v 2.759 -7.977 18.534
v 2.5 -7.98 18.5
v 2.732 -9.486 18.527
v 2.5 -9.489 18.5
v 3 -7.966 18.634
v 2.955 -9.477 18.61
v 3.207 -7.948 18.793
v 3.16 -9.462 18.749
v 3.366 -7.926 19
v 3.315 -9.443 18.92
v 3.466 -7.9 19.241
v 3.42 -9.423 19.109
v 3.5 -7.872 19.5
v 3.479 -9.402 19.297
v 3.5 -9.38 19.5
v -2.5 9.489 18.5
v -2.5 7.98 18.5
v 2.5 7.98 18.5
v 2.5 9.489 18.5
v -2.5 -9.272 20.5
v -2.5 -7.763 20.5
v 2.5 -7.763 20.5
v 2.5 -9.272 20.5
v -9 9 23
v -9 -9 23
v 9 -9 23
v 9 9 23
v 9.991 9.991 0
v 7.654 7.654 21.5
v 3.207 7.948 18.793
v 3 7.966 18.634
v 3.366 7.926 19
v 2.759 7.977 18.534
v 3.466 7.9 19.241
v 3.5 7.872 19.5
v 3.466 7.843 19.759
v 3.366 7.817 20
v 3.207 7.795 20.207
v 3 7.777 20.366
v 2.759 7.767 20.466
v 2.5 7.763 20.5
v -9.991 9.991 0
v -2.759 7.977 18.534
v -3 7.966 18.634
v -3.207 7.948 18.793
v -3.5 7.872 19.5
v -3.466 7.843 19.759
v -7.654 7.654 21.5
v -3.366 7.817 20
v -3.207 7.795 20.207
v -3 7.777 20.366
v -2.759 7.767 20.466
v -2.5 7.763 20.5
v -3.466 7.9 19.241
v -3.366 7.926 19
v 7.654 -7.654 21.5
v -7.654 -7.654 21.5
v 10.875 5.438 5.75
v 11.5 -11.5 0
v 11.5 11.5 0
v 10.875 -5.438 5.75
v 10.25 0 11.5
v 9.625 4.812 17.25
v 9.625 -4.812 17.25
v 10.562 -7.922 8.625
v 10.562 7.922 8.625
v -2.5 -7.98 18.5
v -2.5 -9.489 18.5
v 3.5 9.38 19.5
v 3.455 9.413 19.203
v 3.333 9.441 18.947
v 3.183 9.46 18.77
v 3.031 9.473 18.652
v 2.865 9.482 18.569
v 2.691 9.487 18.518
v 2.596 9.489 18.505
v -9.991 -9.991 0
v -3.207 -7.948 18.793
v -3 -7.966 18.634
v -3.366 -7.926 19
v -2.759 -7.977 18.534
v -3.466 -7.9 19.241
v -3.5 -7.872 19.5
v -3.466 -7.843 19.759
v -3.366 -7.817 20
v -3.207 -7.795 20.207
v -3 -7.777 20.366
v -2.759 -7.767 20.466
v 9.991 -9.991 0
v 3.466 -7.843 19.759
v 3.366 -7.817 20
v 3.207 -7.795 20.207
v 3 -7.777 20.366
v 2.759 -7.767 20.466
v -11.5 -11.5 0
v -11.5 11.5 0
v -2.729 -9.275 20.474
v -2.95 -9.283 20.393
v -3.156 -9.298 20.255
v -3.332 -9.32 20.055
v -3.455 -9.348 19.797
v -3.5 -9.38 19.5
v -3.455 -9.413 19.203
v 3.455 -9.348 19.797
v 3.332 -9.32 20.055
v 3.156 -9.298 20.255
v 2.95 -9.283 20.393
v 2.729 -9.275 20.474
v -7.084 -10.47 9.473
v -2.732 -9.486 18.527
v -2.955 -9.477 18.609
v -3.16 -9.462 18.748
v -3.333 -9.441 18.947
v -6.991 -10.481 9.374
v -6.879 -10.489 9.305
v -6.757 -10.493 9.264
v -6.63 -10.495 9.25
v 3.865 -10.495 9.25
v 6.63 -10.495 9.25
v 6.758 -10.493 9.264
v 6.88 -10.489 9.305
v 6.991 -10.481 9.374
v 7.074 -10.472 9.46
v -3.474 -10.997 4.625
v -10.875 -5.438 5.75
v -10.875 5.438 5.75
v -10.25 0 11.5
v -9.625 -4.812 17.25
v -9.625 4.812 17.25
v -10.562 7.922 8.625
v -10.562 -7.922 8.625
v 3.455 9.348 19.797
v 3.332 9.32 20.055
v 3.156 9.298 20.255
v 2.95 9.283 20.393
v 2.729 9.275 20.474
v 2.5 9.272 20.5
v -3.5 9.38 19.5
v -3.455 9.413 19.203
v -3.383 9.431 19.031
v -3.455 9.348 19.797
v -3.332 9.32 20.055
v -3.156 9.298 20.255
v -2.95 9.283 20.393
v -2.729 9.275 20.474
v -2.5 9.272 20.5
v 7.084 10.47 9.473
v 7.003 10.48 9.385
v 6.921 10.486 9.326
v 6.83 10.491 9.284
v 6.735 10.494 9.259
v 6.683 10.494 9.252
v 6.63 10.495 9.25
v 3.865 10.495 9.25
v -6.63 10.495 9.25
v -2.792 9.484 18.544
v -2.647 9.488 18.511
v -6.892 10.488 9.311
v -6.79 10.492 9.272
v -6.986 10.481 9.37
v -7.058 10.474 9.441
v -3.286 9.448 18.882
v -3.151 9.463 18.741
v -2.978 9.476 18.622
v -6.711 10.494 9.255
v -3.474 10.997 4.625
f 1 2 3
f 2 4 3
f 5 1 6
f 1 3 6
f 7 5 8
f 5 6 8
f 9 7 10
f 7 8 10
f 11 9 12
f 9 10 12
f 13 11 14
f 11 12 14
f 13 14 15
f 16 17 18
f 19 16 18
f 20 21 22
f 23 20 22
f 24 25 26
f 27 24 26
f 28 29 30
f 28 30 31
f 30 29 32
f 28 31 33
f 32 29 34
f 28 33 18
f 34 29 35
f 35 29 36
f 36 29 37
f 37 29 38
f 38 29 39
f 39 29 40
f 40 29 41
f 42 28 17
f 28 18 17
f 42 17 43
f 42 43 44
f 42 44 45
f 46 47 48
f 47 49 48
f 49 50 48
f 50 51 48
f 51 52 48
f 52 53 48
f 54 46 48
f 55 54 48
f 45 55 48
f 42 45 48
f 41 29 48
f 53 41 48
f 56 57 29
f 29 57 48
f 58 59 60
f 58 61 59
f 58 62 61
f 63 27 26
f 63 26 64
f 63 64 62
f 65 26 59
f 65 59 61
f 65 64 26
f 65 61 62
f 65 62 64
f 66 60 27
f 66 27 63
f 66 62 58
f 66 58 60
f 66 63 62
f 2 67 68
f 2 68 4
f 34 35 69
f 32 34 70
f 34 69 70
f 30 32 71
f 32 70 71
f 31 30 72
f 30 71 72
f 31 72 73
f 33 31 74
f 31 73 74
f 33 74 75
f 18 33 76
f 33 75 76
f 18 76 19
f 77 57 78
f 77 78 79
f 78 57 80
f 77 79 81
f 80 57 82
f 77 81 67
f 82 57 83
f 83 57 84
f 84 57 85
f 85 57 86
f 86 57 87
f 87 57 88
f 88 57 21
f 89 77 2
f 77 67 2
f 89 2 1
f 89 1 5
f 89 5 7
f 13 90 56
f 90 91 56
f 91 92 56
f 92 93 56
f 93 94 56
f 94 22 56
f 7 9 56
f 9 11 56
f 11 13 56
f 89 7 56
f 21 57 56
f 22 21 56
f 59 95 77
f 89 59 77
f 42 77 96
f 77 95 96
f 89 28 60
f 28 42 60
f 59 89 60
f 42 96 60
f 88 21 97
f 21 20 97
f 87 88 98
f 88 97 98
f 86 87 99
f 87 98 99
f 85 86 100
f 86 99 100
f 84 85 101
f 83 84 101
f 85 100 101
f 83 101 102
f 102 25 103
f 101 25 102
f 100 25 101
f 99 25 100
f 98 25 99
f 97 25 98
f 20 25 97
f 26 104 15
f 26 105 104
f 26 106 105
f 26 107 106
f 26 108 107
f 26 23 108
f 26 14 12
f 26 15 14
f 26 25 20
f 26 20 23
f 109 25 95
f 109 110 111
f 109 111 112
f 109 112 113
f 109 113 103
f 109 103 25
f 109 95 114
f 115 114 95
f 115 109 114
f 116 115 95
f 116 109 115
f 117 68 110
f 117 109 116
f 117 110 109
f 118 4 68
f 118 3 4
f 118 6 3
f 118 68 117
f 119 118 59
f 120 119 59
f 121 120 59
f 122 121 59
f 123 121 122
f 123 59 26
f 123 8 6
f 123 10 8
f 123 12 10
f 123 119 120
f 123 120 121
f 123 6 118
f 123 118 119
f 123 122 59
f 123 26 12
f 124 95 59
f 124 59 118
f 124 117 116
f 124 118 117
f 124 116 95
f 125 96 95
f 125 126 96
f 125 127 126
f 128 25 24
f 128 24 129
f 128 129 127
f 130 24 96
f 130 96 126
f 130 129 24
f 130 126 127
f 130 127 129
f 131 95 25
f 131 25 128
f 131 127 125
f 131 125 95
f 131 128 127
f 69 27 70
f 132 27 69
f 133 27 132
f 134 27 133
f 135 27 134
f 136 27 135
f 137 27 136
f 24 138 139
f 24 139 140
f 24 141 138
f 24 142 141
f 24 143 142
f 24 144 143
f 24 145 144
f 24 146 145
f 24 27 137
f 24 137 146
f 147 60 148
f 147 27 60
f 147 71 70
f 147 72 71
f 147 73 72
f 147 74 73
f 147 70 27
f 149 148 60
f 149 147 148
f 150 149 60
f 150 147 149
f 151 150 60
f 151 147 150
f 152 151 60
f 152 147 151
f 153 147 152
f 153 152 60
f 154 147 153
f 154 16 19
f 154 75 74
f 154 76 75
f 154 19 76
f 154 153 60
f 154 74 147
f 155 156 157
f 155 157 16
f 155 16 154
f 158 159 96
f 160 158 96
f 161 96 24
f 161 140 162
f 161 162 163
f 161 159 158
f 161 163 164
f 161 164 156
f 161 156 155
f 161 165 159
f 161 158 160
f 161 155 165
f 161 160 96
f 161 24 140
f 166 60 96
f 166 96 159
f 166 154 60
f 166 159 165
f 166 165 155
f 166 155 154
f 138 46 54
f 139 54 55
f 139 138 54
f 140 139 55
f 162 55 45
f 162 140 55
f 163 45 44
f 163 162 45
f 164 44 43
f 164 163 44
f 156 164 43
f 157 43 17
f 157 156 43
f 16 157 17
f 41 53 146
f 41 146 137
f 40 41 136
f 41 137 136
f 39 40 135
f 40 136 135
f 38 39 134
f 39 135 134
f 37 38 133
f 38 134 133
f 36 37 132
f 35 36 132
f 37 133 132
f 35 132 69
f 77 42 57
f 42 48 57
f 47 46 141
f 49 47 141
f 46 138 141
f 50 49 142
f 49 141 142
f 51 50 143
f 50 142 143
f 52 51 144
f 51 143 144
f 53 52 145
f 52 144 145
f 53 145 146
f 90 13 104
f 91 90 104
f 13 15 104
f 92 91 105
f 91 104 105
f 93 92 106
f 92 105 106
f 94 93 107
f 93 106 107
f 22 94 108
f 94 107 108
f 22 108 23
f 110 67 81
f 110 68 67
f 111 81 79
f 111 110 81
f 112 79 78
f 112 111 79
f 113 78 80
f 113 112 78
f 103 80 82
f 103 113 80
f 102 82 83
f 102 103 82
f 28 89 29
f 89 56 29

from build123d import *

# Parameters (mm, degrees)
F1_W          = 23
F1_H          = 23
F2_W          = 18
F2_H          = 18
F4_T          = -1.5
F5_W          = 7
F5_H          = 2
F6_DEPTH      = 11.5010001
F6_DEPTH_BACK = 11.5010001
F7_R          = 0.9999


# Not quite as in the source:
# - a fillet or chamfer is up to 0.001 mm smaller than in the source, because OpenCascade refuses the exact size


with BuildPart() as f3:
    # F1 (on Top) → F3 section 0
    with BuildSketch(Plane.XY):
        Rectangle(F1_W, F1_H)
    # F2 (on offset) → F3 section 1
    with BuildSketch(Plane.XY.offset(23)):
        Rectangle(F2_W, F2_H)
    loft()

    # F4
    f4_openings = [f3.faces().sort_by_distance(p)[0] for p in [
        (0, 0, 0),
    ]]
    offset(amount=F4_T, openings=f4_openings)

    # F5 (on Front) → F6 (cut, two sides)
    with BuildSketch(Plane.XZ) as f6_sk:
        with Locations((0, 19.5)):
            Rectangle(F5_W, F5_H)
    extrude(amount=-F6_DEPTH, mode=Mode.SUBTRACT)
    extrude(f6_sk.sketch, amount=F6_DEPTH_BACK, mode=Mode.SUBTRACT)

    # F7 (radius 1 in the source; OpenCascade refuses exactly that, so slightly less here)
    f7_edges = [f3.edges().sort_by_distance(p)[0] for p in [
        (-3.5, 8.517322, 20.5),
        (-3.5, -8.517322, 20.5),
        (-3.5, 8.734713, 18.5),
        (-3.5, -8.734713, 18.5),
        (3.5, 8.734713, 18.5),
        (3.5, -8.734713, 18.5),
        (3.5, 8.517322, 20.5),
        (3.5, -8.517322, 20.5),
    ]]
    fillet(f7_edges, radius=F7_R)


solid = f3.part
